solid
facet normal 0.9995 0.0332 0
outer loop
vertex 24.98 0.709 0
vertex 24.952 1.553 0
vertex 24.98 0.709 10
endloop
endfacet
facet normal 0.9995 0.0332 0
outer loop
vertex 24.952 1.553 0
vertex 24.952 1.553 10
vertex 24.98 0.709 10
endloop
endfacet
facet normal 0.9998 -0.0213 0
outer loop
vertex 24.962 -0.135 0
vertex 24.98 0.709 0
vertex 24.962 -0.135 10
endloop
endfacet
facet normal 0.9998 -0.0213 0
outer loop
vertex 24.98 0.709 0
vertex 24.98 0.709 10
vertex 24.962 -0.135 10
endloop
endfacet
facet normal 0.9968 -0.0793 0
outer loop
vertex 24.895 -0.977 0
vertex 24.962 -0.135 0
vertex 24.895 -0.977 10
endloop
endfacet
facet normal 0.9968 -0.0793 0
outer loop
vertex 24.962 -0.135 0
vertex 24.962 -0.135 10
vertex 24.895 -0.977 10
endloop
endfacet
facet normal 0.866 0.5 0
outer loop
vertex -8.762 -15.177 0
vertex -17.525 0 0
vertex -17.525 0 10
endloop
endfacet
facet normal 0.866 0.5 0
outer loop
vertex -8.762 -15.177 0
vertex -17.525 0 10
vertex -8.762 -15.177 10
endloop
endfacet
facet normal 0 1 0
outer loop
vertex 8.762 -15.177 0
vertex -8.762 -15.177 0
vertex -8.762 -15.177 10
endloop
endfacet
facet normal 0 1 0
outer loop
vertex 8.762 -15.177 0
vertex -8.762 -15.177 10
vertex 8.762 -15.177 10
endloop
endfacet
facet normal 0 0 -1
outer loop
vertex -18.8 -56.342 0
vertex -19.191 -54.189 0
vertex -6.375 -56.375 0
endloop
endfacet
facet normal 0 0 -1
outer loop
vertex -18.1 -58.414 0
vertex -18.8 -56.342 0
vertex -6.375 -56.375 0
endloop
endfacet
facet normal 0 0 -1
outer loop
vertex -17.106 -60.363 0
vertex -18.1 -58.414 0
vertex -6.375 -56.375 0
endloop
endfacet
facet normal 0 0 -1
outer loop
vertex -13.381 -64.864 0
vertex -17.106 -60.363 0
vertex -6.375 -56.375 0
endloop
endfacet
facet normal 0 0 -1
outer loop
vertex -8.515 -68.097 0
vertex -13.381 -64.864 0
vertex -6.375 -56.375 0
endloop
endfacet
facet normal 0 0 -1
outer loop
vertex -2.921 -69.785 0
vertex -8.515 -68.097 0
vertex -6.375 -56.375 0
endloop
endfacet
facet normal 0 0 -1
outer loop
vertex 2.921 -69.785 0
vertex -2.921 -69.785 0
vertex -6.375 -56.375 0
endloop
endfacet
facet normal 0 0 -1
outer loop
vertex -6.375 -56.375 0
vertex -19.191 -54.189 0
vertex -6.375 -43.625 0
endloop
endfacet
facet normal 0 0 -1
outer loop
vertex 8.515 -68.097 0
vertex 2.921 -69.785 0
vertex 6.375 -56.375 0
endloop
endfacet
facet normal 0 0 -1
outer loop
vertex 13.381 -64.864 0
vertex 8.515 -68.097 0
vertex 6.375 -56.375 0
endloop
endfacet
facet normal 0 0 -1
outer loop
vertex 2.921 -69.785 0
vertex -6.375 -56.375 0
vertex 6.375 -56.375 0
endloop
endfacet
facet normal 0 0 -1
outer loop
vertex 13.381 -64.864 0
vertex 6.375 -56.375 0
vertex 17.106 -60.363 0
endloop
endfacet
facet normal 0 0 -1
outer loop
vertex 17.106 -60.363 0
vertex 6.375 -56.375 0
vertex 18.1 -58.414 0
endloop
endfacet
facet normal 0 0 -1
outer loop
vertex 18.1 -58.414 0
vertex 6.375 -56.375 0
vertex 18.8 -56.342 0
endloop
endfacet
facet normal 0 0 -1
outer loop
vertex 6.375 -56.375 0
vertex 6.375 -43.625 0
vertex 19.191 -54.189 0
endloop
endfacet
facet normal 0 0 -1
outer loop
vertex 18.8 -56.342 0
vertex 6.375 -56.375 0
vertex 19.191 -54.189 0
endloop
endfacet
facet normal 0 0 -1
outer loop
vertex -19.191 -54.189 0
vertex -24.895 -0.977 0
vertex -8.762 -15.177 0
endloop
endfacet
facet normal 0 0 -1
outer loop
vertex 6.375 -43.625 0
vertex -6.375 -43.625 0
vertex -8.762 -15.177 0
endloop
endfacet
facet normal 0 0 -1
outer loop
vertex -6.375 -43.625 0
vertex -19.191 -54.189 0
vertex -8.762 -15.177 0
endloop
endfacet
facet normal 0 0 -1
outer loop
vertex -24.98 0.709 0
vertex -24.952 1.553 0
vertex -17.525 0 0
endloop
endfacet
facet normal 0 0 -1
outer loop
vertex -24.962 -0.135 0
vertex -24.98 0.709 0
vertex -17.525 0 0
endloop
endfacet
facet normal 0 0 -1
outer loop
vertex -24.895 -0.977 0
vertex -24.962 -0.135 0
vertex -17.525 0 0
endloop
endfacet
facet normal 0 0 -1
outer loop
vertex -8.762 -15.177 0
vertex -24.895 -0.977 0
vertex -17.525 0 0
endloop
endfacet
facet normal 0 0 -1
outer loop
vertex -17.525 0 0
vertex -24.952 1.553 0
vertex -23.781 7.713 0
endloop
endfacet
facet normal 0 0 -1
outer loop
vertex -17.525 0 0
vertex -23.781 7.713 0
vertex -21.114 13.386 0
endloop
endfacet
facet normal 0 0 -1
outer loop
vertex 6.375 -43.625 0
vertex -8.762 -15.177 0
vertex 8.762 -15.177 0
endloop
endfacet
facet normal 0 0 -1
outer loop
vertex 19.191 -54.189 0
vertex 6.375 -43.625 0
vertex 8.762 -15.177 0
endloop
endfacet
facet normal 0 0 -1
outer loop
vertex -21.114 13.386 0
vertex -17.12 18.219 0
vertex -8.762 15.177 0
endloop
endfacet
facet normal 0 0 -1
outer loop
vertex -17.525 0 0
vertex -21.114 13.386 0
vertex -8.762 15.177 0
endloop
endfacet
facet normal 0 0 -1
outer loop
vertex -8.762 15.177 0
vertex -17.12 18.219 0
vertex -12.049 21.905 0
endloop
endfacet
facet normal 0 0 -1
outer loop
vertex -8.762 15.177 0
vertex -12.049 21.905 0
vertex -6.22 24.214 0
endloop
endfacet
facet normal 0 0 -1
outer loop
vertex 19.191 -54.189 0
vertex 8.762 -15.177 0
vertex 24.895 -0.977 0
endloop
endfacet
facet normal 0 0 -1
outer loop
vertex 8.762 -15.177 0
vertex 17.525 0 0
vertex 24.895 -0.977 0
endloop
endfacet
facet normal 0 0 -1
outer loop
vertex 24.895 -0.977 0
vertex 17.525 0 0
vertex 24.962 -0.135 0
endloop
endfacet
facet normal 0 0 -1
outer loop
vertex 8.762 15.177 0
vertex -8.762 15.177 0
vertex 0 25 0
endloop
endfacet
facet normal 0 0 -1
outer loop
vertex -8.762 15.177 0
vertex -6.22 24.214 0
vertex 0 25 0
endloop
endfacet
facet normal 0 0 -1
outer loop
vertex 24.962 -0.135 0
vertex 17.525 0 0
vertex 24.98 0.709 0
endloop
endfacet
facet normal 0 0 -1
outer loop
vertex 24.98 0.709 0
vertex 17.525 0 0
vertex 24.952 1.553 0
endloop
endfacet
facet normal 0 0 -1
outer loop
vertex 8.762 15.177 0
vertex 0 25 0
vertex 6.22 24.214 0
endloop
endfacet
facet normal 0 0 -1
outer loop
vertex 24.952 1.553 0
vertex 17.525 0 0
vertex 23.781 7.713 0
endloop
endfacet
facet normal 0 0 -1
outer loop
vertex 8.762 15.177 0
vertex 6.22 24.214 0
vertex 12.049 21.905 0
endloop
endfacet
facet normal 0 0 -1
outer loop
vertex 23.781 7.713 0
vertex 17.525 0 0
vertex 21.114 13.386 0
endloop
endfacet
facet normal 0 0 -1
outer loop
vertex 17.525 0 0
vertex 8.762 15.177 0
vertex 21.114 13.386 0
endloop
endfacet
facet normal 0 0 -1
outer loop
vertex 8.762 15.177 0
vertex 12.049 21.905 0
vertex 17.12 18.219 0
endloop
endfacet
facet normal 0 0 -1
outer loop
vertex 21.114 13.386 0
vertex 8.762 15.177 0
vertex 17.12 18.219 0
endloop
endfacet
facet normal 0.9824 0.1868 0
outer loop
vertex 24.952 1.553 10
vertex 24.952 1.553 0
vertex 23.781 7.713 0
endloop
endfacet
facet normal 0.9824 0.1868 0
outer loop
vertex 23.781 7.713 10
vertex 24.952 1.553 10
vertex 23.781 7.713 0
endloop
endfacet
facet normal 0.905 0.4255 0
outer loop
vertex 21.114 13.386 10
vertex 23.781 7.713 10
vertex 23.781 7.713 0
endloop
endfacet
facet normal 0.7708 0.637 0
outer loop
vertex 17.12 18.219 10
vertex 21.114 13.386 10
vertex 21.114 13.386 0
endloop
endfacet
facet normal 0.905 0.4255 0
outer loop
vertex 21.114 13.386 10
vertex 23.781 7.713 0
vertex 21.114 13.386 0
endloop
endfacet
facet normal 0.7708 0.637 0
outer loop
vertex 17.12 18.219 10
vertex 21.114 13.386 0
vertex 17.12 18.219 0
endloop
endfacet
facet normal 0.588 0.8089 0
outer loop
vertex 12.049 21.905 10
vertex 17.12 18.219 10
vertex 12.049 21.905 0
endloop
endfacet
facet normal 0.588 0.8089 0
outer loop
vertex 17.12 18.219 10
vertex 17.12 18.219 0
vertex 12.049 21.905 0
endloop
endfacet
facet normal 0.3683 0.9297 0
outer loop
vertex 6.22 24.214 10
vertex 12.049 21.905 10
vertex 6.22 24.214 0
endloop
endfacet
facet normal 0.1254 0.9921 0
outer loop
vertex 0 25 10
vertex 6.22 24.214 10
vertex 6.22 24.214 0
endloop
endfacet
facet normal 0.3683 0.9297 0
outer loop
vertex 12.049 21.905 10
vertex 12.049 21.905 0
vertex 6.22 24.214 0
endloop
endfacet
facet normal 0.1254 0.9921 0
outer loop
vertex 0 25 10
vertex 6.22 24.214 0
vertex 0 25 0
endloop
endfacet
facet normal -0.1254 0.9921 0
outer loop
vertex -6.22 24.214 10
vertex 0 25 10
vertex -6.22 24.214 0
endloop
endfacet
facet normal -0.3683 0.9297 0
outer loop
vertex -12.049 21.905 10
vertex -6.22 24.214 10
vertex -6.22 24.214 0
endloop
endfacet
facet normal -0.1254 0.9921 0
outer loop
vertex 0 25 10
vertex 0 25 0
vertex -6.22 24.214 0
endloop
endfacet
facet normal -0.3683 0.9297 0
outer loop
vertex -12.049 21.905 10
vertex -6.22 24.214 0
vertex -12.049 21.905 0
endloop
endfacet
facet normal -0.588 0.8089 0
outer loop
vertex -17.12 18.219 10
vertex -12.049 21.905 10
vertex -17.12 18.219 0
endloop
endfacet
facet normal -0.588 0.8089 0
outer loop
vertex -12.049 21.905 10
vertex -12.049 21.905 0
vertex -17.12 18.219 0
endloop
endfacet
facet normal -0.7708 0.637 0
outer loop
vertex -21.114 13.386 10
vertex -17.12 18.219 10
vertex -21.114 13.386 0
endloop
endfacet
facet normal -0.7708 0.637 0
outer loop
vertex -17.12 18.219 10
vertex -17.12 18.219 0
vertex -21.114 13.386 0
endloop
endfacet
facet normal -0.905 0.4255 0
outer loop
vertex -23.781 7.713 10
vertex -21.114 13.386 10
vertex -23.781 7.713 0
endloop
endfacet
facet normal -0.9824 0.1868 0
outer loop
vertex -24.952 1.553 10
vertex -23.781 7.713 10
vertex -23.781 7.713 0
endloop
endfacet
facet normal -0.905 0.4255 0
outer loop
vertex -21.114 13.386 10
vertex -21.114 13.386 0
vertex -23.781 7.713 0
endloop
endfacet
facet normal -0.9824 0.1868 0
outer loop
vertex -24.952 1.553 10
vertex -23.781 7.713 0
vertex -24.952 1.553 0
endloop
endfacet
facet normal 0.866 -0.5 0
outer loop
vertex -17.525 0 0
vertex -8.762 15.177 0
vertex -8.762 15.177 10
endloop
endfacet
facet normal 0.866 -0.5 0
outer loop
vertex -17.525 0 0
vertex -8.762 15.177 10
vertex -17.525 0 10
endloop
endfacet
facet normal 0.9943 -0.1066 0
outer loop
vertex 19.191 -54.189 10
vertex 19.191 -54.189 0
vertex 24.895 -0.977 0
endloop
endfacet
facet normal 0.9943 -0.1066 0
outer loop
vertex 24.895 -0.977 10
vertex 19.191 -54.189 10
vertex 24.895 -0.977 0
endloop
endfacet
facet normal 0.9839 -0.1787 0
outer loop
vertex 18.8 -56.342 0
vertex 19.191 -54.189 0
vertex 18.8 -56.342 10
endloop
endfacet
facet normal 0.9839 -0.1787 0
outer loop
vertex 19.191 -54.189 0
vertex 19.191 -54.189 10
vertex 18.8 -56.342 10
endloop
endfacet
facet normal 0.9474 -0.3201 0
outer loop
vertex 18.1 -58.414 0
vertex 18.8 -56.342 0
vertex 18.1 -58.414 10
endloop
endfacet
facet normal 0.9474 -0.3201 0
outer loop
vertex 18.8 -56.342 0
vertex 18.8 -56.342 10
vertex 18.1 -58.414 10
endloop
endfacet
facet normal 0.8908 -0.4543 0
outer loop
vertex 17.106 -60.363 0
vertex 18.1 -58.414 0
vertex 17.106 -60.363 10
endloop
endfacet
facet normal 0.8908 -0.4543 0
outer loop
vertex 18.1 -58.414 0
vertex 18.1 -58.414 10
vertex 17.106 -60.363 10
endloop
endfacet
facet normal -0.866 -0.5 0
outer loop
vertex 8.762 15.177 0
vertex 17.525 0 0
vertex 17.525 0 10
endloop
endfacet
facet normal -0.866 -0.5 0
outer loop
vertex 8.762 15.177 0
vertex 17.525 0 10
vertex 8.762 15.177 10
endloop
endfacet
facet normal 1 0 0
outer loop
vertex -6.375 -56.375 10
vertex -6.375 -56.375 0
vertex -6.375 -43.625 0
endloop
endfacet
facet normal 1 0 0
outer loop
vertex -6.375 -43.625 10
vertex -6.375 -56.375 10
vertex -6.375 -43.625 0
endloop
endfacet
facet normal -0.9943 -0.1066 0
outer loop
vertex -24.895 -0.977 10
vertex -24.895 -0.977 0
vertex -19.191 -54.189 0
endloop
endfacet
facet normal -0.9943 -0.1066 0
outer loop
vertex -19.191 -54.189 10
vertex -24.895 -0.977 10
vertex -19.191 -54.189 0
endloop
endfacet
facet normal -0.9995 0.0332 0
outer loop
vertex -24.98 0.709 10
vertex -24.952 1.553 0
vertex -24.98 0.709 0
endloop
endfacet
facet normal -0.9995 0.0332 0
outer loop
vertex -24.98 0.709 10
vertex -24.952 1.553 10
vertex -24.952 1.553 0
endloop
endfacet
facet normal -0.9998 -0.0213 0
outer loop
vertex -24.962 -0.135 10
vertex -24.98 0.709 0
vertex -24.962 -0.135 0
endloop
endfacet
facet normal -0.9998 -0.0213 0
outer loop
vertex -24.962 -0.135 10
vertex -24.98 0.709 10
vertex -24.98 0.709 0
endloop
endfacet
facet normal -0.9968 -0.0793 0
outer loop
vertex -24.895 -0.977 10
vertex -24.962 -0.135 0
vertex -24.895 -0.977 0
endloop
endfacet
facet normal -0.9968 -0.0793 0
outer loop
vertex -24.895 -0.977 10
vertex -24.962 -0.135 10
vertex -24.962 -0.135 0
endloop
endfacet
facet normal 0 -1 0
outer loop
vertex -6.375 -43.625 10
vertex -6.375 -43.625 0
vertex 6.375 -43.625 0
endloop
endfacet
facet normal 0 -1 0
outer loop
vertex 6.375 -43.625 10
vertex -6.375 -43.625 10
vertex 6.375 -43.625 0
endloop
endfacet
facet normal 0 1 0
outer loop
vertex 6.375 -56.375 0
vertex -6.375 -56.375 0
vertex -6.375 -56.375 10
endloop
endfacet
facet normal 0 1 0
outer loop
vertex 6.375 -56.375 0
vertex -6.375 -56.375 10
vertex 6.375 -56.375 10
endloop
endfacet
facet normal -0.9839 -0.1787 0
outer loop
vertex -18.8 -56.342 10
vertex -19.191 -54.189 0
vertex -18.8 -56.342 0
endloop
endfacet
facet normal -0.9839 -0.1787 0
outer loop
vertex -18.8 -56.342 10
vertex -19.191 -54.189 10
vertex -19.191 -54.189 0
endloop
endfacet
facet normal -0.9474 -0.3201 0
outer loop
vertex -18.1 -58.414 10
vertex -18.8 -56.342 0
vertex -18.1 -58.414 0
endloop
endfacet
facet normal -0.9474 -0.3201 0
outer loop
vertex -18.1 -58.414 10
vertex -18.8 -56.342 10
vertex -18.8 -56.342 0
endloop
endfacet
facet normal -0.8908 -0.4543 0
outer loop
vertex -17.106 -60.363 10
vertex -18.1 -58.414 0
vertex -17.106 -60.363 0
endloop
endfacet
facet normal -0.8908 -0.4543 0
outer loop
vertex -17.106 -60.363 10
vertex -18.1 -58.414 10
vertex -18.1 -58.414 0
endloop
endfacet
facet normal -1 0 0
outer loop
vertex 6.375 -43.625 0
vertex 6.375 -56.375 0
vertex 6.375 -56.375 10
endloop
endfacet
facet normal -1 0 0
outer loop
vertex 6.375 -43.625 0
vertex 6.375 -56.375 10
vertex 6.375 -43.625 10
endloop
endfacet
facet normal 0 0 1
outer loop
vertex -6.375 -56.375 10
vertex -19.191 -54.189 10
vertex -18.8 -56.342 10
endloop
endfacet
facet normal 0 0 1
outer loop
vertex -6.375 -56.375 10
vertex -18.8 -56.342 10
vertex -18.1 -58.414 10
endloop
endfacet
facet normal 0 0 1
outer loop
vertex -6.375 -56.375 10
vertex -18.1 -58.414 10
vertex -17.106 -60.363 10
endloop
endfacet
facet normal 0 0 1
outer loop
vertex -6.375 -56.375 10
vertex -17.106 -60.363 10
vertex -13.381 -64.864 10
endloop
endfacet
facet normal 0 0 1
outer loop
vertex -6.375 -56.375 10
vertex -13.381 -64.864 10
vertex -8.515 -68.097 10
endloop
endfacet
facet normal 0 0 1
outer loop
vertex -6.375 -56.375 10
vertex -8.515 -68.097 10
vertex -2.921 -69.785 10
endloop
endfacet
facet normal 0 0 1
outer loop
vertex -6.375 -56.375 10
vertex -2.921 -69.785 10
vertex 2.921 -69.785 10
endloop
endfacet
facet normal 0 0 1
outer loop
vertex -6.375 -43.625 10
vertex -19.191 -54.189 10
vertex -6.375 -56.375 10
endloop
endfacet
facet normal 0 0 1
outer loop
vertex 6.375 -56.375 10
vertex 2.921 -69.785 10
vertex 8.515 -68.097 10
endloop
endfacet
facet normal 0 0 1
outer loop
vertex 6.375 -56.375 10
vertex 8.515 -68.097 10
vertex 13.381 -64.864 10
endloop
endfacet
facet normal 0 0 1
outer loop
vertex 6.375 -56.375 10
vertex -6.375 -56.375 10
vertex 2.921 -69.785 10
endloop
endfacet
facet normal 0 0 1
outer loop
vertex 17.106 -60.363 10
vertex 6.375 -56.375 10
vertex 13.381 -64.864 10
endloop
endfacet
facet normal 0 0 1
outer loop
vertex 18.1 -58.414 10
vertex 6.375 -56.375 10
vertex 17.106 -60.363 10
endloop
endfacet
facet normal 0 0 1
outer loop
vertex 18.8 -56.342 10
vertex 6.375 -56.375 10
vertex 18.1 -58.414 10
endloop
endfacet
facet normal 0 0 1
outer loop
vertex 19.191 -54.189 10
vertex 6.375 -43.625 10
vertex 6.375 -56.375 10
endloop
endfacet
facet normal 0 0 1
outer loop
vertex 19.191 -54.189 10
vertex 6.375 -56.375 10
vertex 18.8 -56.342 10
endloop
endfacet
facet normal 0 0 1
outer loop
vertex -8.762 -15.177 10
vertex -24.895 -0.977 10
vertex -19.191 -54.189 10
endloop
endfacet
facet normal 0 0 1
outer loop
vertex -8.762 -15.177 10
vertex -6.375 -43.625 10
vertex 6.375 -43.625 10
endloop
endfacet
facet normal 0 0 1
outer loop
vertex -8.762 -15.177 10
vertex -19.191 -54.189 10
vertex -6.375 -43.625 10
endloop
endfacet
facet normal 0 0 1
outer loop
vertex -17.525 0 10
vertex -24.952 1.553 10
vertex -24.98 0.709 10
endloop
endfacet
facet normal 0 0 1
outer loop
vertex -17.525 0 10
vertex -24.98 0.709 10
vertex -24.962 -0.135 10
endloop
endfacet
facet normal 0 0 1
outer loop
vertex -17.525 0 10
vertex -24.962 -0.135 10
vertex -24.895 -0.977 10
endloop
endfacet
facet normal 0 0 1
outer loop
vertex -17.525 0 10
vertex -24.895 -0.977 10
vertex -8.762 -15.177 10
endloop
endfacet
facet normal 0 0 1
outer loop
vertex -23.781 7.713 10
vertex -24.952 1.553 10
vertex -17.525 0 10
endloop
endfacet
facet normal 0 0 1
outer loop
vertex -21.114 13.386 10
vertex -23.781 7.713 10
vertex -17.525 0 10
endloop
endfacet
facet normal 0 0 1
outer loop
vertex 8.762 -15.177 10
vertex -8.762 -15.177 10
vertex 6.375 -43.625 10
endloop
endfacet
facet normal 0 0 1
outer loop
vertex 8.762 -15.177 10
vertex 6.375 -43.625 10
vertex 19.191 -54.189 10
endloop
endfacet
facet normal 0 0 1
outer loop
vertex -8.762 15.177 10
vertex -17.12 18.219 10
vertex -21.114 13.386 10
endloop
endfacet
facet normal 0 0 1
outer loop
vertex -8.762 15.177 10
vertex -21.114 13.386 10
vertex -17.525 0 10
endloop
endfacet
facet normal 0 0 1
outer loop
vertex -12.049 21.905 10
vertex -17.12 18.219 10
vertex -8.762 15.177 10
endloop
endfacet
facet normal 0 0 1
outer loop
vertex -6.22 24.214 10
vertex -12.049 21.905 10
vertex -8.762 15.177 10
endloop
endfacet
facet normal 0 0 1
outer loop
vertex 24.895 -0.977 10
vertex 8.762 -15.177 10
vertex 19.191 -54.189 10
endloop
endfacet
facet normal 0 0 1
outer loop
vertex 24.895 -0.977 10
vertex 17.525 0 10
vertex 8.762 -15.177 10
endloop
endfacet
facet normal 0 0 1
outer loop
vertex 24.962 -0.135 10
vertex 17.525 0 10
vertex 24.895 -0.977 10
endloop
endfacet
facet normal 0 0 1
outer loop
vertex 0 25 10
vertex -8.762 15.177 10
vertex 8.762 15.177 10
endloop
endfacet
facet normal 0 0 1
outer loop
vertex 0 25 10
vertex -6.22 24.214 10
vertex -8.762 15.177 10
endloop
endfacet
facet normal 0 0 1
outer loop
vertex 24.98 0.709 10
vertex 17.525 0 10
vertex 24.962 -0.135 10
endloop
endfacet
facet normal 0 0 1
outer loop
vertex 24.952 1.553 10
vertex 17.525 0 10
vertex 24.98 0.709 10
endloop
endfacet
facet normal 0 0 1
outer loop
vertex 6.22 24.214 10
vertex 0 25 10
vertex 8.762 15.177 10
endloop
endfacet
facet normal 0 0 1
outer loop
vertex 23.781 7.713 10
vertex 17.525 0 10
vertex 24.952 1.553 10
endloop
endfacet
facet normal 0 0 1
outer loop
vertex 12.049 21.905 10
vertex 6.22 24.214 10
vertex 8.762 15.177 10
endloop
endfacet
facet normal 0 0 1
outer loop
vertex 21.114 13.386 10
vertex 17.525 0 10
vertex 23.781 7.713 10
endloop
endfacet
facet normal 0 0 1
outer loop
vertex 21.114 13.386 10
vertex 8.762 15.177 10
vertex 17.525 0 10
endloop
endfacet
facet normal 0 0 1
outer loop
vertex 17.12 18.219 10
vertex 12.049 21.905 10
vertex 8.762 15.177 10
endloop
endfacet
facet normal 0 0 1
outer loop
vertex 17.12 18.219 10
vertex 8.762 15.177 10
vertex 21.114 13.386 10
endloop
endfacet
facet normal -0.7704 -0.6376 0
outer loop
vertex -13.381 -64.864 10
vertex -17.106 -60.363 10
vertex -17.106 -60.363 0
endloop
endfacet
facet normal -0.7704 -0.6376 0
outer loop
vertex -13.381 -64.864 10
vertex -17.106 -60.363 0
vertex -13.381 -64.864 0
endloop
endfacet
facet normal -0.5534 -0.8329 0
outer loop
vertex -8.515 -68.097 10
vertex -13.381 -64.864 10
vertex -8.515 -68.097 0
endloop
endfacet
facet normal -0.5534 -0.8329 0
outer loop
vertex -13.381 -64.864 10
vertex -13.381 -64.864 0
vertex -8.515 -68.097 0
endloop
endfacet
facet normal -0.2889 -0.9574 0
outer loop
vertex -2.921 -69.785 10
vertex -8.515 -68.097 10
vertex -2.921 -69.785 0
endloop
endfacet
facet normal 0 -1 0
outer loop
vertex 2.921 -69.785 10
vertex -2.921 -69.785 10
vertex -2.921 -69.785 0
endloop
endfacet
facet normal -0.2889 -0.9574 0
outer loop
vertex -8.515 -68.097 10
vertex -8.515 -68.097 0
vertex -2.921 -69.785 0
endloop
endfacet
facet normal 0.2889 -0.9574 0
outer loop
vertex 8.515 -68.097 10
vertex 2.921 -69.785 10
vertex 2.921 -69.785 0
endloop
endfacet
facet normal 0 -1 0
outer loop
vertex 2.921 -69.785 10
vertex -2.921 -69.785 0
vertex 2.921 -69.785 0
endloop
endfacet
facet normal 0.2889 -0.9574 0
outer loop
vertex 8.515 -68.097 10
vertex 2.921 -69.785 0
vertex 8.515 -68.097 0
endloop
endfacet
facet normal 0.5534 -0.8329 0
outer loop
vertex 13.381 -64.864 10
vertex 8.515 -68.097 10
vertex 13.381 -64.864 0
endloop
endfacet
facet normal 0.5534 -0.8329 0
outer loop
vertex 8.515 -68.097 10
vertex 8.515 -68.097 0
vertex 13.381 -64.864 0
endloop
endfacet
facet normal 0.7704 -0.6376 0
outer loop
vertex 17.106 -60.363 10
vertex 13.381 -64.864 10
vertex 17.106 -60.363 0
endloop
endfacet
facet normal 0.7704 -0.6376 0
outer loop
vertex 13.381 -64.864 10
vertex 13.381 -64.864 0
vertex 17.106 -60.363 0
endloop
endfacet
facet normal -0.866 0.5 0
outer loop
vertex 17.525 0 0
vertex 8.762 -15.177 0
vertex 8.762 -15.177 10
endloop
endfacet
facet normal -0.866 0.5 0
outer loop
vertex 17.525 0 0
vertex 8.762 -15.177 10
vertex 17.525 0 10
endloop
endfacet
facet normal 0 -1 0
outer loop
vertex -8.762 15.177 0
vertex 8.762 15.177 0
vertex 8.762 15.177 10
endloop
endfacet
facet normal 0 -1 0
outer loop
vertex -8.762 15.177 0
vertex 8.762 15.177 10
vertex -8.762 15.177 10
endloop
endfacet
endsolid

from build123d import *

# Parameters (mm, degrees)
SKETCH_W  = 12.75
SKETCH_H  = 12.75
PAD_DEPTH = 10
FILLET_R  = 15


with BuildPart() as part:
    # Sketch → Pad (new body)
    with BuildSketch(Plane.XY):
        with BuildLine():
            ThreePointArc((25, 0), (0, 25), (-25, 0))
            Line((-25, 0), (-18.956776, -56.375))
            ThreePointArc((-18.956776, -56.375), (0, -70), (18.956776, -56.375))
            Line((18.956776, -56.375), (25, 0))
        make_face()
        Polygon((-17.525, 0), (-8.7625, -15.177095), (8.7625, -15.177095), (17.525, 0), (8.7625, 15.177095), (-8.7625, 15.177095), align=None, mode=Mode.SUBTRACT)
        with Locations((0, -50)):
            Rectangle(SKETCH_W, SKETCH_H, mode=Mode.SUBTRACT)
    extrude(amount=PAD_DEPTH)

    # Fillet
    fillet_edges = [part.edges().sort_by_distance(p)[0] for p in [
        (-25, 0, 5),
        (-18.956776, -56.375, 5),
        (18.956776, -56.375, 5),
        (25, 0, 5),
    ]]
    fillet(fillet_edges, radius=FILLET_R)


solid = part.part
